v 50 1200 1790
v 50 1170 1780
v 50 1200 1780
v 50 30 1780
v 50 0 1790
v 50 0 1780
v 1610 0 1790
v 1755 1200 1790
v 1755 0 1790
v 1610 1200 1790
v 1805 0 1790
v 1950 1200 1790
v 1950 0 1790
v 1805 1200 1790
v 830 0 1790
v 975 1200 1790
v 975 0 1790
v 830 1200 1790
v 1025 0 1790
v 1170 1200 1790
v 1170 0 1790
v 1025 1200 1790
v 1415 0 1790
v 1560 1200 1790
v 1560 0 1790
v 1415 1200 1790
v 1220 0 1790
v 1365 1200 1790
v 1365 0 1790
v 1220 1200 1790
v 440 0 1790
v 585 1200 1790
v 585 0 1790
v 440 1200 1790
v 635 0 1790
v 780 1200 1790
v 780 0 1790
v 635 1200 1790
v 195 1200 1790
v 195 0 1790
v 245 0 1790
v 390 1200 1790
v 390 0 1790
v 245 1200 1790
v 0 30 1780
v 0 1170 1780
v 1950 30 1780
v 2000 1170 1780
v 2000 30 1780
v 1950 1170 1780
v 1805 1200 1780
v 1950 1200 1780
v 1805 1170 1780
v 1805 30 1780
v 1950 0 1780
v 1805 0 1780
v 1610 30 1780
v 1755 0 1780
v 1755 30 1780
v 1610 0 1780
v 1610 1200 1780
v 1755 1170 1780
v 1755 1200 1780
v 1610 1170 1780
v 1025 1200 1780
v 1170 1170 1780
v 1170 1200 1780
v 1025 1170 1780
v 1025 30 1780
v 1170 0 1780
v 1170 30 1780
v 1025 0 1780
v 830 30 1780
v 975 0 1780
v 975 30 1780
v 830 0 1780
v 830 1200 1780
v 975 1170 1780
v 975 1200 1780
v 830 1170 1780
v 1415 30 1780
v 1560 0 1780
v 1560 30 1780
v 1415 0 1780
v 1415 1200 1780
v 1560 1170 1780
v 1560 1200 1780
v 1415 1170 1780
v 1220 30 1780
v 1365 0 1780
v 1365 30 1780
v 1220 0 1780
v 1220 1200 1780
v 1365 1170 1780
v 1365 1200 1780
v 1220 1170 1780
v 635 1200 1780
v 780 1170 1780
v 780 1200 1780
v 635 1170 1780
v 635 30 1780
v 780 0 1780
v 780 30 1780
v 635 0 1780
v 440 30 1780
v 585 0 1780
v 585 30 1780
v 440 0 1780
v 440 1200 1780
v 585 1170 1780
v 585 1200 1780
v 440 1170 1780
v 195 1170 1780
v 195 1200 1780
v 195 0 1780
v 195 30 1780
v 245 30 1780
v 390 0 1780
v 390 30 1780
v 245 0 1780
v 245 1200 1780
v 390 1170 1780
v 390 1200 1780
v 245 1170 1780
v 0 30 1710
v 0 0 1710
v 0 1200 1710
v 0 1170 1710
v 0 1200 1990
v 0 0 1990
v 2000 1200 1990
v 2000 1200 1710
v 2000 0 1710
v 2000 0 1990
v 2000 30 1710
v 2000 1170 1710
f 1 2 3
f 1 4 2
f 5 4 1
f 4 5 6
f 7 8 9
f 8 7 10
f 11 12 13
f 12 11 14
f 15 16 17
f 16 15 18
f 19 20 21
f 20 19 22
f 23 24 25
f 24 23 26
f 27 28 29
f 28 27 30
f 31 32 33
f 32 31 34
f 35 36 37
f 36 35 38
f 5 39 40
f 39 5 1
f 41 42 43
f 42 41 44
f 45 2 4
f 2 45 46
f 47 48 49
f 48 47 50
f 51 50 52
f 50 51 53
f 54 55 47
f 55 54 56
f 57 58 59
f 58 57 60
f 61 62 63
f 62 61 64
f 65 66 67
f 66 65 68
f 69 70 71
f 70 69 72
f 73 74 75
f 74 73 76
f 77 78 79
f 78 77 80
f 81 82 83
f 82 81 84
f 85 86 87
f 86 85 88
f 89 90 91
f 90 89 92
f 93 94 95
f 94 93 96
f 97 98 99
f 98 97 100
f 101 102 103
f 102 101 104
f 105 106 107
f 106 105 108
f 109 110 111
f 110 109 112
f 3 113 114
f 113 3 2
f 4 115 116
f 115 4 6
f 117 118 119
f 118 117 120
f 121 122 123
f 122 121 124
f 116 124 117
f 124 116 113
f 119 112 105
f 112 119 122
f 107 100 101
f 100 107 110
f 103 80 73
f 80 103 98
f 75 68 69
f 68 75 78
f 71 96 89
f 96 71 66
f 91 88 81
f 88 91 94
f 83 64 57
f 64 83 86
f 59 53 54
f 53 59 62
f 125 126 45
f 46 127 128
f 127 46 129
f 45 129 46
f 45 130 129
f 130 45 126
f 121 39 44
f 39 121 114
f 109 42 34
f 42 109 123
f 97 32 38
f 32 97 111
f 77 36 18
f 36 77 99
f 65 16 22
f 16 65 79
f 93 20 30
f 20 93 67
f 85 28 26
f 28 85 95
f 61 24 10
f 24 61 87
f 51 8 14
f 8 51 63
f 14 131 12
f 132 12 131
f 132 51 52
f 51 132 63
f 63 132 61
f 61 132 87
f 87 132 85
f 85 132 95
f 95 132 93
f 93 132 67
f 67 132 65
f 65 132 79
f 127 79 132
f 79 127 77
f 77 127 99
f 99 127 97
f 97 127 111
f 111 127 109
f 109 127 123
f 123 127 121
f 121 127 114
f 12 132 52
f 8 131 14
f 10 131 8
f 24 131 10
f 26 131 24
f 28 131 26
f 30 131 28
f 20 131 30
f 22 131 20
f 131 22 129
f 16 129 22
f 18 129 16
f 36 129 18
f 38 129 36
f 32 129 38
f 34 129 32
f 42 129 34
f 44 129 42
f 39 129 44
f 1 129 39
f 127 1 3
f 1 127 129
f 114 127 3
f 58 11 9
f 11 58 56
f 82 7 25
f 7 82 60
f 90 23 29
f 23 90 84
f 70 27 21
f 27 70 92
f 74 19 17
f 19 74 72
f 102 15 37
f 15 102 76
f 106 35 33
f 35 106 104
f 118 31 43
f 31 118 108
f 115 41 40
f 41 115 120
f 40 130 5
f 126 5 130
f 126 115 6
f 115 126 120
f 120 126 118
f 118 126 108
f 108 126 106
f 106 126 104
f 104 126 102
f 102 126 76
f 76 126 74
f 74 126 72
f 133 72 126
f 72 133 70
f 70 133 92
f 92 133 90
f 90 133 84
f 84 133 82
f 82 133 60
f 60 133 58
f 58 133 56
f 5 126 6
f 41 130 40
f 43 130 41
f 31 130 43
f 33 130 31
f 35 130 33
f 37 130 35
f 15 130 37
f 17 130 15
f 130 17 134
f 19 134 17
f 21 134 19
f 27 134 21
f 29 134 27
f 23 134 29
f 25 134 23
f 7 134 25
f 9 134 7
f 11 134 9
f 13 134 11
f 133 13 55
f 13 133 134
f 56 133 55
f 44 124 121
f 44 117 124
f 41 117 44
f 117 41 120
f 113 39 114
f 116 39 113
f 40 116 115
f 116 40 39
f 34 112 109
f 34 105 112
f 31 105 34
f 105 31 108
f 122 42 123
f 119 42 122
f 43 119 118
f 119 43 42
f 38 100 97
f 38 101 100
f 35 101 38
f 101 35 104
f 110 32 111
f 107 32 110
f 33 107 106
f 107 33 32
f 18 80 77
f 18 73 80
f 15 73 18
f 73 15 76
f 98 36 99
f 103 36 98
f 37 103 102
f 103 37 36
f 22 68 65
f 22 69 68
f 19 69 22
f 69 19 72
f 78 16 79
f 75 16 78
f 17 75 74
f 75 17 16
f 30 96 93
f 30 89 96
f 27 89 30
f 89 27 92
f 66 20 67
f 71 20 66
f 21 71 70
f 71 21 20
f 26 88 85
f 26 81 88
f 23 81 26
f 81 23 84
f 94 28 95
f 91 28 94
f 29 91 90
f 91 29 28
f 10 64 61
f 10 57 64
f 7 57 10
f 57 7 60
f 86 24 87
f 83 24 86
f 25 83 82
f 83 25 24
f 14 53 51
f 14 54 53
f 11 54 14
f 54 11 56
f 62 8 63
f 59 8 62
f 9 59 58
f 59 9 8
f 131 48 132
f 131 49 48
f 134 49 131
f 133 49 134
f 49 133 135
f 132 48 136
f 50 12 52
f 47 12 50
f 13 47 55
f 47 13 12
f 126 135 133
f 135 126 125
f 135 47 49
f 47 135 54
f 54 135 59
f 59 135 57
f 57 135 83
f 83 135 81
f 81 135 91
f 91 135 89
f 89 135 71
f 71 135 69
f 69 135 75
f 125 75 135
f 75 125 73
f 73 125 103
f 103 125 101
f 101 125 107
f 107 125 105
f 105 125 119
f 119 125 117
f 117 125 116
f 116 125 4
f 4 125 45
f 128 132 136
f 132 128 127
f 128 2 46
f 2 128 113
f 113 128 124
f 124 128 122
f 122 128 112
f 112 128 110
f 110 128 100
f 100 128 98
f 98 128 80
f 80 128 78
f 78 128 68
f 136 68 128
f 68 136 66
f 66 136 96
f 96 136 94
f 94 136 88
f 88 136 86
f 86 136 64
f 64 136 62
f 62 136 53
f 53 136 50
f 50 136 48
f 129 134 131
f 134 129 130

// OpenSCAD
// file: dummy_lying_surface.scad
// Render Precision
$fn=50;


module lying_surface(frame=[2000,1200,80],frame_color="yellow",mattress=[2000,1200,20],mattress_color="orange"){
    // module to draw a dummy frame
    module slattedframe(){
        framebeam_width = 30;
        slat_height     = 10;
        slat_width      = 50;
        slat_number     = 10;
        slat_distance   = (frame[0]-(slat_number+1)*slat_width)/slat_number;

        cube([frame[0],framebeam_width,frame[2]-slat_height]);
        translate([0,frame[1]-framebeam_width,0]){
            cube([frame[0],framebeam_width,frame[2]-slat_height]);
        };
        for(i=[0:1:slat_number])
            translate([i*slat_width+i*slat_distance,0,frame[2]-slat_height]){
                cube([slat_width,frame[1],slat_height]);
            };
    }

    // module to draw a dummy mattress
    module mattress(){
        cube([mattress[0],mattress[1],mattress[2]]);
    }

    color(frame_color) slattedframe();
    color(mattress_color) translate([0,0,frame[2]]){mattress();}
}
// main file
// Render Precision
$fn=50;

/*
Dimension definitions
*/
structural_thickness    =   21;
color_loadbearing       =   "Blue";
color_placeholder       =   "Yellow";
color_placeholder_soft  =   "Orange";

tolerance_slattedframe  =   10;

// space for slatted frame and mattress
mattress_height         =   200;
mattress_width          =   1200;
mattress_length         =   2000;
slattedframe_height     =   80;
slattedframe_width      =   1200;
slattedframe_length     =   2000;
lying_surface_height    =   slattedframe_height + mattress_height + tolerance_slattedframe;
lying_surface_width     =   slattedframe_width + tolerance_slattedframe;
lying_surface_length    =   slattedframe_length + tolerance_slattedframe;

// dimensions of loftbed
entry_height            =   2000;    // distance floor to upper surface of the mattress
bedrail_height          =   250; 

// Draw a slatted frame and a mattress
use <dummy_lying_surface.scad>

translate([0,0,entry_height - lying_surface_height])
    lying_surface([slattedframe_length,slattedframe_width,slattedframe_height],color_placeholder,
                  [mattress_length,mattress_width,mattress_height],color_placeholder_soft);
